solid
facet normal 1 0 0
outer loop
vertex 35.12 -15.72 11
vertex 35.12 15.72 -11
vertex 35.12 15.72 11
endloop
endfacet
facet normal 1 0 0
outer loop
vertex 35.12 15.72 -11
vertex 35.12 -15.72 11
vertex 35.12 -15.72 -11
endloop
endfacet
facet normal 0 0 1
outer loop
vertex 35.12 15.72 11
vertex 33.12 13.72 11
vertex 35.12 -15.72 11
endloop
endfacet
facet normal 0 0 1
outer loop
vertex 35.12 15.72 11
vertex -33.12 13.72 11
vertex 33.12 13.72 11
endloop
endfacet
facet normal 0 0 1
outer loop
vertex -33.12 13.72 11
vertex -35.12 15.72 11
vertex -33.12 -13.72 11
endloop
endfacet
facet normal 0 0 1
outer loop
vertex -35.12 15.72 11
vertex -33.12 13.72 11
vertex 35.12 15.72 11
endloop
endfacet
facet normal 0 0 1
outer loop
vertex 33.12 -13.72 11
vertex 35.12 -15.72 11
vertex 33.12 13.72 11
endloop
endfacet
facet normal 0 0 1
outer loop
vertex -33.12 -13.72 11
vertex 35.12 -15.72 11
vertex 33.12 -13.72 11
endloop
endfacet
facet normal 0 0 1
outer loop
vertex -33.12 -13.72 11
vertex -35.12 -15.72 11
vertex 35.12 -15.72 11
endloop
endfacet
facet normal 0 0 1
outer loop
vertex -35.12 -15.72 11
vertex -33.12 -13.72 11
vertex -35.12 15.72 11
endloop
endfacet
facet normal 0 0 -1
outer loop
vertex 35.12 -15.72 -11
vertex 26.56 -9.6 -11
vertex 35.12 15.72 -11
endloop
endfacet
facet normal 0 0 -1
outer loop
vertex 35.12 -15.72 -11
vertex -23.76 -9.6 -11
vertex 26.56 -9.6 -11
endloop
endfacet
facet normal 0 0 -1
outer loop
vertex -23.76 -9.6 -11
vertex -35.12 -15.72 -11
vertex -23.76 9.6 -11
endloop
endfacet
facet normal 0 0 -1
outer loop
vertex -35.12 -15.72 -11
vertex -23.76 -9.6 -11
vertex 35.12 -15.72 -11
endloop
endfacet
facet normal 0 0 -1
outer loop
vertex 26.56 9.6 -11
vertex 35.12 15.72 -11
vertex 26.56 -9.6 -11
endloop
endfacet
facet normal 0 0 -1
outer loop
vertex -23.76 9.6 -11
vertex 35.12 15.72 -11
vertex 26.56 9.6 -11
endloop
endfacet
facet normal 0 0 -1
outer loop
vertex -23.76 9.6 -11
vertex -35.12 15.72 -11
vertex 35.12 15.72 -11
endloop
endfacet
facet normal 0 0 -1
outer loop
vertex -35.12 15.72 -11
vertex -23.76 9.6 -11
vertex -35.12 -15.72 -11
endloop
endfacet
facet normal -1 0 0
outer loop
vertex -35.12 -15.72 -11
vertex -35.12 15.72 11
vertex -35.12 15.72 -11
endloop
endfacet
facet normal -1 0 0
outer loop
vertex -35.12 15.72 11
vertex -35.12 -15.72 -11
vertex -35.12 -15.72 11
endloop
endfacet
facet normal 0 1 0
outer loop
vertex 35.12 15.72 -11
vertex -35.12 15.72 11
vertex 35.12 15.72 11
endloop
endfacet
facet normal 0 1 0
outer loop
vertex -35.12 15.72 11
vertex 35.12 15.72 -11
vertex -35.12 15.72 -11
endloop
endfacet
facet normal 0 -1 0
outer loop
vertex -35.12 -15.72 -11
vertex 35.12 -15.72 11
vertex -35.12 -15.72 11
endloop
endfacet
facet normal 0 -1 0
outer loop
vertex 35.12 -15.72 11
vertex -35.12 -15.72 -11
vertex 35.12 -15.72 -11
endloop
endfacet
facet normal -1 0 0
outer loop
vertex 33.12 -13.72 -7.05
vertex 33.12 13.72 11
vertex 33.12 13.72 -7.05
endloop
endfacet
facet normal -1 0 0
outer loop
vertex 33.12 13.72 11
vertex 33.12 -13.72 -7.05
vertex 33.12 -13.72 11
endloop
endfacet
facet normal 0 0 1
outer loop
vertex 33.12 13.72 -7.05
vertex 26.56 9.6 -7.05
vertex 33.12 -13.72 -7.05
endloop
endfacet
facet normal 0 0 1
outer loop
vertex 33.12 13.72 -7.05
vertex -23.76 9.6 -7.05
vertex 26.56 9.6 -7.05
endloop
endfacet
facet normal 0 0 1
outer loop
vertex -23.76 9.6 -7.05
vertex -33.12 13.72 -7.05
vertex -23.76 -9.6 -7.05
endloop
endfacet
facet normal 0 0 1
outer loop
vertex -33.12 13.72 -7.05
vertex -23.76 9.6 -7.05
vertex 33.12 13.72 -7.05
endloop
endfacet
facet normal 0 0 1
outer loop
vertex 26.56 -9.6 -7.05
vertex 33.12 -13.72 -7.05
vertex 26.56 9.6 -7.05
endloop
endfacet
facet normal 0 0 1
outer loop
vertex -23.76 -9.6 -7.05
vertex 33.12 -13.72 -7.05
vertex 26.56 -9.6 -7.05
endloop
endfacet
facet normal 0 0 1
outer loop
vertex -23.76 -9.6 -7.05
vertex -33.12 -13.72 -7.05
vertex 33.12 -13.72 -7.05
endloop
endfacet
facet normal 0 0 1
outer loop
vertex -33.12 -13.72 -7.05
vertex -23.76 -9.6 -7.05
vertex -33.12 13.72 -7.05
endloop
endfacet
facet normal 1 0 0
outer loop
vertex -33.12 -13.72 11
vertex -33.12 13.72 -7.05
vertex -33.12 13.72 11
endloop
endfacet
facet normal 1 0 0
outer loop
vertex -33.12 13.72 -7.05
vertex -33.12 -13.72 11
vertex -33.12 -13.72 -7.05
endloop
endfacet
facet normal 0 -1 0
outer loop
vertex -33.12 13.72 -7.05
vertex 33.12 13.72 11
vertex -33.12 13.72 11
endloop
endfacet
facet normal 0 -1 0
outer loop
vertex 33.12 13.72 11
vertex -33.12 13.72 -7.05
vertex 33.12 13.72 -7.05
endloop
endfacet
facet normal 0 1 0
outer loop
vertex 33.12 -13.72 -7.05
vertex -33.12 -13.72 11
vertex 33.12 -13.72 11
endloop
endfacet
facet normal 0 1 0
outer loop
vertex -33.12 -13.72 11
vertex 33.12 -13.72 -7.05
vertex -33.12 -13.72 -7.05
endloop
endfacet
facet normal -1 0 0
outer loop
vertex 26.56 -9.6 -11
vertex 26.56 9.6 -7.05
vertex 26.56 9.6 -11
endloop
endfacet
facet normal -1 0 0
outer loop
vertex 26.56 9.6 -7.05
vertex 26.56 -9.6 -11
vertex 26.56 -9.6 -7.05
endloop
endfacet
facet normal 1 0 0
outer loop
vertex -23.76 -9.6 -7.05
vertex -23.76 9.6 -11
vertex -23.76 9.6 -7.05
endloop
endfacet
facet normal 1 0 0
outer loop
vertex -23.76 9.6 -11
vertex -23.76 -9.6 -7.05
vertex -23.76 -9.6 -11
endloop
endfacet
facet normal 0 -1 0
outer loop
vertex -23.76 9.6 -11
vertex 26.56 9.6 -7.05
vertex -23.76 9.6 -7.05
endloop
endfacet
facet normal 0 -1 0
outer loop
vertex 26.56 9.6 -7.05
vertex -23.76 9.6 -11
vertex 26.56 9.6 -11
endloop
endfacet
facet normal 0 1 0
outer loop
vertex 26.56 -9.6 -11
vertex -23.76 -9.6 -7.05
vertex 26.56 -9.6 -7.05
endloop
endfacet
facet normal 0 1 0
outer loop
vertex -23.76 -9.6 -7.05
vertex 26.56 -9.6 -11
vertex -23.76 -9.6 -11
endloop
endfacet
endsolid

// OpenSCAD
wall_thickness = 2;
display_width = 66.24;
display_height = 27.44;
disp_cutout_width = 50.32;
disp_cutout_height = 19.2;
box_height = 18;

what_to_render = "box"; // box or lid

if (what_to_render == "box") {
  difference() {

    // outer cube
    cube([display_width + (2 * wall_thickness), display_height + (2 * wall_thickness), box_height + (2 * wall_thickness)], center = true);

    // inner cube volume
    translate([0, 0, wall_thickness]) cube([display_width, display_height, box_height + 0.1], center = true);
    
    // display cutout
    color("red") translate([1.4, 0, -(box_height/2)]) cube([disp_cutout_width, disp_cutout_height, box_height + 1], center = true);
  }
}
